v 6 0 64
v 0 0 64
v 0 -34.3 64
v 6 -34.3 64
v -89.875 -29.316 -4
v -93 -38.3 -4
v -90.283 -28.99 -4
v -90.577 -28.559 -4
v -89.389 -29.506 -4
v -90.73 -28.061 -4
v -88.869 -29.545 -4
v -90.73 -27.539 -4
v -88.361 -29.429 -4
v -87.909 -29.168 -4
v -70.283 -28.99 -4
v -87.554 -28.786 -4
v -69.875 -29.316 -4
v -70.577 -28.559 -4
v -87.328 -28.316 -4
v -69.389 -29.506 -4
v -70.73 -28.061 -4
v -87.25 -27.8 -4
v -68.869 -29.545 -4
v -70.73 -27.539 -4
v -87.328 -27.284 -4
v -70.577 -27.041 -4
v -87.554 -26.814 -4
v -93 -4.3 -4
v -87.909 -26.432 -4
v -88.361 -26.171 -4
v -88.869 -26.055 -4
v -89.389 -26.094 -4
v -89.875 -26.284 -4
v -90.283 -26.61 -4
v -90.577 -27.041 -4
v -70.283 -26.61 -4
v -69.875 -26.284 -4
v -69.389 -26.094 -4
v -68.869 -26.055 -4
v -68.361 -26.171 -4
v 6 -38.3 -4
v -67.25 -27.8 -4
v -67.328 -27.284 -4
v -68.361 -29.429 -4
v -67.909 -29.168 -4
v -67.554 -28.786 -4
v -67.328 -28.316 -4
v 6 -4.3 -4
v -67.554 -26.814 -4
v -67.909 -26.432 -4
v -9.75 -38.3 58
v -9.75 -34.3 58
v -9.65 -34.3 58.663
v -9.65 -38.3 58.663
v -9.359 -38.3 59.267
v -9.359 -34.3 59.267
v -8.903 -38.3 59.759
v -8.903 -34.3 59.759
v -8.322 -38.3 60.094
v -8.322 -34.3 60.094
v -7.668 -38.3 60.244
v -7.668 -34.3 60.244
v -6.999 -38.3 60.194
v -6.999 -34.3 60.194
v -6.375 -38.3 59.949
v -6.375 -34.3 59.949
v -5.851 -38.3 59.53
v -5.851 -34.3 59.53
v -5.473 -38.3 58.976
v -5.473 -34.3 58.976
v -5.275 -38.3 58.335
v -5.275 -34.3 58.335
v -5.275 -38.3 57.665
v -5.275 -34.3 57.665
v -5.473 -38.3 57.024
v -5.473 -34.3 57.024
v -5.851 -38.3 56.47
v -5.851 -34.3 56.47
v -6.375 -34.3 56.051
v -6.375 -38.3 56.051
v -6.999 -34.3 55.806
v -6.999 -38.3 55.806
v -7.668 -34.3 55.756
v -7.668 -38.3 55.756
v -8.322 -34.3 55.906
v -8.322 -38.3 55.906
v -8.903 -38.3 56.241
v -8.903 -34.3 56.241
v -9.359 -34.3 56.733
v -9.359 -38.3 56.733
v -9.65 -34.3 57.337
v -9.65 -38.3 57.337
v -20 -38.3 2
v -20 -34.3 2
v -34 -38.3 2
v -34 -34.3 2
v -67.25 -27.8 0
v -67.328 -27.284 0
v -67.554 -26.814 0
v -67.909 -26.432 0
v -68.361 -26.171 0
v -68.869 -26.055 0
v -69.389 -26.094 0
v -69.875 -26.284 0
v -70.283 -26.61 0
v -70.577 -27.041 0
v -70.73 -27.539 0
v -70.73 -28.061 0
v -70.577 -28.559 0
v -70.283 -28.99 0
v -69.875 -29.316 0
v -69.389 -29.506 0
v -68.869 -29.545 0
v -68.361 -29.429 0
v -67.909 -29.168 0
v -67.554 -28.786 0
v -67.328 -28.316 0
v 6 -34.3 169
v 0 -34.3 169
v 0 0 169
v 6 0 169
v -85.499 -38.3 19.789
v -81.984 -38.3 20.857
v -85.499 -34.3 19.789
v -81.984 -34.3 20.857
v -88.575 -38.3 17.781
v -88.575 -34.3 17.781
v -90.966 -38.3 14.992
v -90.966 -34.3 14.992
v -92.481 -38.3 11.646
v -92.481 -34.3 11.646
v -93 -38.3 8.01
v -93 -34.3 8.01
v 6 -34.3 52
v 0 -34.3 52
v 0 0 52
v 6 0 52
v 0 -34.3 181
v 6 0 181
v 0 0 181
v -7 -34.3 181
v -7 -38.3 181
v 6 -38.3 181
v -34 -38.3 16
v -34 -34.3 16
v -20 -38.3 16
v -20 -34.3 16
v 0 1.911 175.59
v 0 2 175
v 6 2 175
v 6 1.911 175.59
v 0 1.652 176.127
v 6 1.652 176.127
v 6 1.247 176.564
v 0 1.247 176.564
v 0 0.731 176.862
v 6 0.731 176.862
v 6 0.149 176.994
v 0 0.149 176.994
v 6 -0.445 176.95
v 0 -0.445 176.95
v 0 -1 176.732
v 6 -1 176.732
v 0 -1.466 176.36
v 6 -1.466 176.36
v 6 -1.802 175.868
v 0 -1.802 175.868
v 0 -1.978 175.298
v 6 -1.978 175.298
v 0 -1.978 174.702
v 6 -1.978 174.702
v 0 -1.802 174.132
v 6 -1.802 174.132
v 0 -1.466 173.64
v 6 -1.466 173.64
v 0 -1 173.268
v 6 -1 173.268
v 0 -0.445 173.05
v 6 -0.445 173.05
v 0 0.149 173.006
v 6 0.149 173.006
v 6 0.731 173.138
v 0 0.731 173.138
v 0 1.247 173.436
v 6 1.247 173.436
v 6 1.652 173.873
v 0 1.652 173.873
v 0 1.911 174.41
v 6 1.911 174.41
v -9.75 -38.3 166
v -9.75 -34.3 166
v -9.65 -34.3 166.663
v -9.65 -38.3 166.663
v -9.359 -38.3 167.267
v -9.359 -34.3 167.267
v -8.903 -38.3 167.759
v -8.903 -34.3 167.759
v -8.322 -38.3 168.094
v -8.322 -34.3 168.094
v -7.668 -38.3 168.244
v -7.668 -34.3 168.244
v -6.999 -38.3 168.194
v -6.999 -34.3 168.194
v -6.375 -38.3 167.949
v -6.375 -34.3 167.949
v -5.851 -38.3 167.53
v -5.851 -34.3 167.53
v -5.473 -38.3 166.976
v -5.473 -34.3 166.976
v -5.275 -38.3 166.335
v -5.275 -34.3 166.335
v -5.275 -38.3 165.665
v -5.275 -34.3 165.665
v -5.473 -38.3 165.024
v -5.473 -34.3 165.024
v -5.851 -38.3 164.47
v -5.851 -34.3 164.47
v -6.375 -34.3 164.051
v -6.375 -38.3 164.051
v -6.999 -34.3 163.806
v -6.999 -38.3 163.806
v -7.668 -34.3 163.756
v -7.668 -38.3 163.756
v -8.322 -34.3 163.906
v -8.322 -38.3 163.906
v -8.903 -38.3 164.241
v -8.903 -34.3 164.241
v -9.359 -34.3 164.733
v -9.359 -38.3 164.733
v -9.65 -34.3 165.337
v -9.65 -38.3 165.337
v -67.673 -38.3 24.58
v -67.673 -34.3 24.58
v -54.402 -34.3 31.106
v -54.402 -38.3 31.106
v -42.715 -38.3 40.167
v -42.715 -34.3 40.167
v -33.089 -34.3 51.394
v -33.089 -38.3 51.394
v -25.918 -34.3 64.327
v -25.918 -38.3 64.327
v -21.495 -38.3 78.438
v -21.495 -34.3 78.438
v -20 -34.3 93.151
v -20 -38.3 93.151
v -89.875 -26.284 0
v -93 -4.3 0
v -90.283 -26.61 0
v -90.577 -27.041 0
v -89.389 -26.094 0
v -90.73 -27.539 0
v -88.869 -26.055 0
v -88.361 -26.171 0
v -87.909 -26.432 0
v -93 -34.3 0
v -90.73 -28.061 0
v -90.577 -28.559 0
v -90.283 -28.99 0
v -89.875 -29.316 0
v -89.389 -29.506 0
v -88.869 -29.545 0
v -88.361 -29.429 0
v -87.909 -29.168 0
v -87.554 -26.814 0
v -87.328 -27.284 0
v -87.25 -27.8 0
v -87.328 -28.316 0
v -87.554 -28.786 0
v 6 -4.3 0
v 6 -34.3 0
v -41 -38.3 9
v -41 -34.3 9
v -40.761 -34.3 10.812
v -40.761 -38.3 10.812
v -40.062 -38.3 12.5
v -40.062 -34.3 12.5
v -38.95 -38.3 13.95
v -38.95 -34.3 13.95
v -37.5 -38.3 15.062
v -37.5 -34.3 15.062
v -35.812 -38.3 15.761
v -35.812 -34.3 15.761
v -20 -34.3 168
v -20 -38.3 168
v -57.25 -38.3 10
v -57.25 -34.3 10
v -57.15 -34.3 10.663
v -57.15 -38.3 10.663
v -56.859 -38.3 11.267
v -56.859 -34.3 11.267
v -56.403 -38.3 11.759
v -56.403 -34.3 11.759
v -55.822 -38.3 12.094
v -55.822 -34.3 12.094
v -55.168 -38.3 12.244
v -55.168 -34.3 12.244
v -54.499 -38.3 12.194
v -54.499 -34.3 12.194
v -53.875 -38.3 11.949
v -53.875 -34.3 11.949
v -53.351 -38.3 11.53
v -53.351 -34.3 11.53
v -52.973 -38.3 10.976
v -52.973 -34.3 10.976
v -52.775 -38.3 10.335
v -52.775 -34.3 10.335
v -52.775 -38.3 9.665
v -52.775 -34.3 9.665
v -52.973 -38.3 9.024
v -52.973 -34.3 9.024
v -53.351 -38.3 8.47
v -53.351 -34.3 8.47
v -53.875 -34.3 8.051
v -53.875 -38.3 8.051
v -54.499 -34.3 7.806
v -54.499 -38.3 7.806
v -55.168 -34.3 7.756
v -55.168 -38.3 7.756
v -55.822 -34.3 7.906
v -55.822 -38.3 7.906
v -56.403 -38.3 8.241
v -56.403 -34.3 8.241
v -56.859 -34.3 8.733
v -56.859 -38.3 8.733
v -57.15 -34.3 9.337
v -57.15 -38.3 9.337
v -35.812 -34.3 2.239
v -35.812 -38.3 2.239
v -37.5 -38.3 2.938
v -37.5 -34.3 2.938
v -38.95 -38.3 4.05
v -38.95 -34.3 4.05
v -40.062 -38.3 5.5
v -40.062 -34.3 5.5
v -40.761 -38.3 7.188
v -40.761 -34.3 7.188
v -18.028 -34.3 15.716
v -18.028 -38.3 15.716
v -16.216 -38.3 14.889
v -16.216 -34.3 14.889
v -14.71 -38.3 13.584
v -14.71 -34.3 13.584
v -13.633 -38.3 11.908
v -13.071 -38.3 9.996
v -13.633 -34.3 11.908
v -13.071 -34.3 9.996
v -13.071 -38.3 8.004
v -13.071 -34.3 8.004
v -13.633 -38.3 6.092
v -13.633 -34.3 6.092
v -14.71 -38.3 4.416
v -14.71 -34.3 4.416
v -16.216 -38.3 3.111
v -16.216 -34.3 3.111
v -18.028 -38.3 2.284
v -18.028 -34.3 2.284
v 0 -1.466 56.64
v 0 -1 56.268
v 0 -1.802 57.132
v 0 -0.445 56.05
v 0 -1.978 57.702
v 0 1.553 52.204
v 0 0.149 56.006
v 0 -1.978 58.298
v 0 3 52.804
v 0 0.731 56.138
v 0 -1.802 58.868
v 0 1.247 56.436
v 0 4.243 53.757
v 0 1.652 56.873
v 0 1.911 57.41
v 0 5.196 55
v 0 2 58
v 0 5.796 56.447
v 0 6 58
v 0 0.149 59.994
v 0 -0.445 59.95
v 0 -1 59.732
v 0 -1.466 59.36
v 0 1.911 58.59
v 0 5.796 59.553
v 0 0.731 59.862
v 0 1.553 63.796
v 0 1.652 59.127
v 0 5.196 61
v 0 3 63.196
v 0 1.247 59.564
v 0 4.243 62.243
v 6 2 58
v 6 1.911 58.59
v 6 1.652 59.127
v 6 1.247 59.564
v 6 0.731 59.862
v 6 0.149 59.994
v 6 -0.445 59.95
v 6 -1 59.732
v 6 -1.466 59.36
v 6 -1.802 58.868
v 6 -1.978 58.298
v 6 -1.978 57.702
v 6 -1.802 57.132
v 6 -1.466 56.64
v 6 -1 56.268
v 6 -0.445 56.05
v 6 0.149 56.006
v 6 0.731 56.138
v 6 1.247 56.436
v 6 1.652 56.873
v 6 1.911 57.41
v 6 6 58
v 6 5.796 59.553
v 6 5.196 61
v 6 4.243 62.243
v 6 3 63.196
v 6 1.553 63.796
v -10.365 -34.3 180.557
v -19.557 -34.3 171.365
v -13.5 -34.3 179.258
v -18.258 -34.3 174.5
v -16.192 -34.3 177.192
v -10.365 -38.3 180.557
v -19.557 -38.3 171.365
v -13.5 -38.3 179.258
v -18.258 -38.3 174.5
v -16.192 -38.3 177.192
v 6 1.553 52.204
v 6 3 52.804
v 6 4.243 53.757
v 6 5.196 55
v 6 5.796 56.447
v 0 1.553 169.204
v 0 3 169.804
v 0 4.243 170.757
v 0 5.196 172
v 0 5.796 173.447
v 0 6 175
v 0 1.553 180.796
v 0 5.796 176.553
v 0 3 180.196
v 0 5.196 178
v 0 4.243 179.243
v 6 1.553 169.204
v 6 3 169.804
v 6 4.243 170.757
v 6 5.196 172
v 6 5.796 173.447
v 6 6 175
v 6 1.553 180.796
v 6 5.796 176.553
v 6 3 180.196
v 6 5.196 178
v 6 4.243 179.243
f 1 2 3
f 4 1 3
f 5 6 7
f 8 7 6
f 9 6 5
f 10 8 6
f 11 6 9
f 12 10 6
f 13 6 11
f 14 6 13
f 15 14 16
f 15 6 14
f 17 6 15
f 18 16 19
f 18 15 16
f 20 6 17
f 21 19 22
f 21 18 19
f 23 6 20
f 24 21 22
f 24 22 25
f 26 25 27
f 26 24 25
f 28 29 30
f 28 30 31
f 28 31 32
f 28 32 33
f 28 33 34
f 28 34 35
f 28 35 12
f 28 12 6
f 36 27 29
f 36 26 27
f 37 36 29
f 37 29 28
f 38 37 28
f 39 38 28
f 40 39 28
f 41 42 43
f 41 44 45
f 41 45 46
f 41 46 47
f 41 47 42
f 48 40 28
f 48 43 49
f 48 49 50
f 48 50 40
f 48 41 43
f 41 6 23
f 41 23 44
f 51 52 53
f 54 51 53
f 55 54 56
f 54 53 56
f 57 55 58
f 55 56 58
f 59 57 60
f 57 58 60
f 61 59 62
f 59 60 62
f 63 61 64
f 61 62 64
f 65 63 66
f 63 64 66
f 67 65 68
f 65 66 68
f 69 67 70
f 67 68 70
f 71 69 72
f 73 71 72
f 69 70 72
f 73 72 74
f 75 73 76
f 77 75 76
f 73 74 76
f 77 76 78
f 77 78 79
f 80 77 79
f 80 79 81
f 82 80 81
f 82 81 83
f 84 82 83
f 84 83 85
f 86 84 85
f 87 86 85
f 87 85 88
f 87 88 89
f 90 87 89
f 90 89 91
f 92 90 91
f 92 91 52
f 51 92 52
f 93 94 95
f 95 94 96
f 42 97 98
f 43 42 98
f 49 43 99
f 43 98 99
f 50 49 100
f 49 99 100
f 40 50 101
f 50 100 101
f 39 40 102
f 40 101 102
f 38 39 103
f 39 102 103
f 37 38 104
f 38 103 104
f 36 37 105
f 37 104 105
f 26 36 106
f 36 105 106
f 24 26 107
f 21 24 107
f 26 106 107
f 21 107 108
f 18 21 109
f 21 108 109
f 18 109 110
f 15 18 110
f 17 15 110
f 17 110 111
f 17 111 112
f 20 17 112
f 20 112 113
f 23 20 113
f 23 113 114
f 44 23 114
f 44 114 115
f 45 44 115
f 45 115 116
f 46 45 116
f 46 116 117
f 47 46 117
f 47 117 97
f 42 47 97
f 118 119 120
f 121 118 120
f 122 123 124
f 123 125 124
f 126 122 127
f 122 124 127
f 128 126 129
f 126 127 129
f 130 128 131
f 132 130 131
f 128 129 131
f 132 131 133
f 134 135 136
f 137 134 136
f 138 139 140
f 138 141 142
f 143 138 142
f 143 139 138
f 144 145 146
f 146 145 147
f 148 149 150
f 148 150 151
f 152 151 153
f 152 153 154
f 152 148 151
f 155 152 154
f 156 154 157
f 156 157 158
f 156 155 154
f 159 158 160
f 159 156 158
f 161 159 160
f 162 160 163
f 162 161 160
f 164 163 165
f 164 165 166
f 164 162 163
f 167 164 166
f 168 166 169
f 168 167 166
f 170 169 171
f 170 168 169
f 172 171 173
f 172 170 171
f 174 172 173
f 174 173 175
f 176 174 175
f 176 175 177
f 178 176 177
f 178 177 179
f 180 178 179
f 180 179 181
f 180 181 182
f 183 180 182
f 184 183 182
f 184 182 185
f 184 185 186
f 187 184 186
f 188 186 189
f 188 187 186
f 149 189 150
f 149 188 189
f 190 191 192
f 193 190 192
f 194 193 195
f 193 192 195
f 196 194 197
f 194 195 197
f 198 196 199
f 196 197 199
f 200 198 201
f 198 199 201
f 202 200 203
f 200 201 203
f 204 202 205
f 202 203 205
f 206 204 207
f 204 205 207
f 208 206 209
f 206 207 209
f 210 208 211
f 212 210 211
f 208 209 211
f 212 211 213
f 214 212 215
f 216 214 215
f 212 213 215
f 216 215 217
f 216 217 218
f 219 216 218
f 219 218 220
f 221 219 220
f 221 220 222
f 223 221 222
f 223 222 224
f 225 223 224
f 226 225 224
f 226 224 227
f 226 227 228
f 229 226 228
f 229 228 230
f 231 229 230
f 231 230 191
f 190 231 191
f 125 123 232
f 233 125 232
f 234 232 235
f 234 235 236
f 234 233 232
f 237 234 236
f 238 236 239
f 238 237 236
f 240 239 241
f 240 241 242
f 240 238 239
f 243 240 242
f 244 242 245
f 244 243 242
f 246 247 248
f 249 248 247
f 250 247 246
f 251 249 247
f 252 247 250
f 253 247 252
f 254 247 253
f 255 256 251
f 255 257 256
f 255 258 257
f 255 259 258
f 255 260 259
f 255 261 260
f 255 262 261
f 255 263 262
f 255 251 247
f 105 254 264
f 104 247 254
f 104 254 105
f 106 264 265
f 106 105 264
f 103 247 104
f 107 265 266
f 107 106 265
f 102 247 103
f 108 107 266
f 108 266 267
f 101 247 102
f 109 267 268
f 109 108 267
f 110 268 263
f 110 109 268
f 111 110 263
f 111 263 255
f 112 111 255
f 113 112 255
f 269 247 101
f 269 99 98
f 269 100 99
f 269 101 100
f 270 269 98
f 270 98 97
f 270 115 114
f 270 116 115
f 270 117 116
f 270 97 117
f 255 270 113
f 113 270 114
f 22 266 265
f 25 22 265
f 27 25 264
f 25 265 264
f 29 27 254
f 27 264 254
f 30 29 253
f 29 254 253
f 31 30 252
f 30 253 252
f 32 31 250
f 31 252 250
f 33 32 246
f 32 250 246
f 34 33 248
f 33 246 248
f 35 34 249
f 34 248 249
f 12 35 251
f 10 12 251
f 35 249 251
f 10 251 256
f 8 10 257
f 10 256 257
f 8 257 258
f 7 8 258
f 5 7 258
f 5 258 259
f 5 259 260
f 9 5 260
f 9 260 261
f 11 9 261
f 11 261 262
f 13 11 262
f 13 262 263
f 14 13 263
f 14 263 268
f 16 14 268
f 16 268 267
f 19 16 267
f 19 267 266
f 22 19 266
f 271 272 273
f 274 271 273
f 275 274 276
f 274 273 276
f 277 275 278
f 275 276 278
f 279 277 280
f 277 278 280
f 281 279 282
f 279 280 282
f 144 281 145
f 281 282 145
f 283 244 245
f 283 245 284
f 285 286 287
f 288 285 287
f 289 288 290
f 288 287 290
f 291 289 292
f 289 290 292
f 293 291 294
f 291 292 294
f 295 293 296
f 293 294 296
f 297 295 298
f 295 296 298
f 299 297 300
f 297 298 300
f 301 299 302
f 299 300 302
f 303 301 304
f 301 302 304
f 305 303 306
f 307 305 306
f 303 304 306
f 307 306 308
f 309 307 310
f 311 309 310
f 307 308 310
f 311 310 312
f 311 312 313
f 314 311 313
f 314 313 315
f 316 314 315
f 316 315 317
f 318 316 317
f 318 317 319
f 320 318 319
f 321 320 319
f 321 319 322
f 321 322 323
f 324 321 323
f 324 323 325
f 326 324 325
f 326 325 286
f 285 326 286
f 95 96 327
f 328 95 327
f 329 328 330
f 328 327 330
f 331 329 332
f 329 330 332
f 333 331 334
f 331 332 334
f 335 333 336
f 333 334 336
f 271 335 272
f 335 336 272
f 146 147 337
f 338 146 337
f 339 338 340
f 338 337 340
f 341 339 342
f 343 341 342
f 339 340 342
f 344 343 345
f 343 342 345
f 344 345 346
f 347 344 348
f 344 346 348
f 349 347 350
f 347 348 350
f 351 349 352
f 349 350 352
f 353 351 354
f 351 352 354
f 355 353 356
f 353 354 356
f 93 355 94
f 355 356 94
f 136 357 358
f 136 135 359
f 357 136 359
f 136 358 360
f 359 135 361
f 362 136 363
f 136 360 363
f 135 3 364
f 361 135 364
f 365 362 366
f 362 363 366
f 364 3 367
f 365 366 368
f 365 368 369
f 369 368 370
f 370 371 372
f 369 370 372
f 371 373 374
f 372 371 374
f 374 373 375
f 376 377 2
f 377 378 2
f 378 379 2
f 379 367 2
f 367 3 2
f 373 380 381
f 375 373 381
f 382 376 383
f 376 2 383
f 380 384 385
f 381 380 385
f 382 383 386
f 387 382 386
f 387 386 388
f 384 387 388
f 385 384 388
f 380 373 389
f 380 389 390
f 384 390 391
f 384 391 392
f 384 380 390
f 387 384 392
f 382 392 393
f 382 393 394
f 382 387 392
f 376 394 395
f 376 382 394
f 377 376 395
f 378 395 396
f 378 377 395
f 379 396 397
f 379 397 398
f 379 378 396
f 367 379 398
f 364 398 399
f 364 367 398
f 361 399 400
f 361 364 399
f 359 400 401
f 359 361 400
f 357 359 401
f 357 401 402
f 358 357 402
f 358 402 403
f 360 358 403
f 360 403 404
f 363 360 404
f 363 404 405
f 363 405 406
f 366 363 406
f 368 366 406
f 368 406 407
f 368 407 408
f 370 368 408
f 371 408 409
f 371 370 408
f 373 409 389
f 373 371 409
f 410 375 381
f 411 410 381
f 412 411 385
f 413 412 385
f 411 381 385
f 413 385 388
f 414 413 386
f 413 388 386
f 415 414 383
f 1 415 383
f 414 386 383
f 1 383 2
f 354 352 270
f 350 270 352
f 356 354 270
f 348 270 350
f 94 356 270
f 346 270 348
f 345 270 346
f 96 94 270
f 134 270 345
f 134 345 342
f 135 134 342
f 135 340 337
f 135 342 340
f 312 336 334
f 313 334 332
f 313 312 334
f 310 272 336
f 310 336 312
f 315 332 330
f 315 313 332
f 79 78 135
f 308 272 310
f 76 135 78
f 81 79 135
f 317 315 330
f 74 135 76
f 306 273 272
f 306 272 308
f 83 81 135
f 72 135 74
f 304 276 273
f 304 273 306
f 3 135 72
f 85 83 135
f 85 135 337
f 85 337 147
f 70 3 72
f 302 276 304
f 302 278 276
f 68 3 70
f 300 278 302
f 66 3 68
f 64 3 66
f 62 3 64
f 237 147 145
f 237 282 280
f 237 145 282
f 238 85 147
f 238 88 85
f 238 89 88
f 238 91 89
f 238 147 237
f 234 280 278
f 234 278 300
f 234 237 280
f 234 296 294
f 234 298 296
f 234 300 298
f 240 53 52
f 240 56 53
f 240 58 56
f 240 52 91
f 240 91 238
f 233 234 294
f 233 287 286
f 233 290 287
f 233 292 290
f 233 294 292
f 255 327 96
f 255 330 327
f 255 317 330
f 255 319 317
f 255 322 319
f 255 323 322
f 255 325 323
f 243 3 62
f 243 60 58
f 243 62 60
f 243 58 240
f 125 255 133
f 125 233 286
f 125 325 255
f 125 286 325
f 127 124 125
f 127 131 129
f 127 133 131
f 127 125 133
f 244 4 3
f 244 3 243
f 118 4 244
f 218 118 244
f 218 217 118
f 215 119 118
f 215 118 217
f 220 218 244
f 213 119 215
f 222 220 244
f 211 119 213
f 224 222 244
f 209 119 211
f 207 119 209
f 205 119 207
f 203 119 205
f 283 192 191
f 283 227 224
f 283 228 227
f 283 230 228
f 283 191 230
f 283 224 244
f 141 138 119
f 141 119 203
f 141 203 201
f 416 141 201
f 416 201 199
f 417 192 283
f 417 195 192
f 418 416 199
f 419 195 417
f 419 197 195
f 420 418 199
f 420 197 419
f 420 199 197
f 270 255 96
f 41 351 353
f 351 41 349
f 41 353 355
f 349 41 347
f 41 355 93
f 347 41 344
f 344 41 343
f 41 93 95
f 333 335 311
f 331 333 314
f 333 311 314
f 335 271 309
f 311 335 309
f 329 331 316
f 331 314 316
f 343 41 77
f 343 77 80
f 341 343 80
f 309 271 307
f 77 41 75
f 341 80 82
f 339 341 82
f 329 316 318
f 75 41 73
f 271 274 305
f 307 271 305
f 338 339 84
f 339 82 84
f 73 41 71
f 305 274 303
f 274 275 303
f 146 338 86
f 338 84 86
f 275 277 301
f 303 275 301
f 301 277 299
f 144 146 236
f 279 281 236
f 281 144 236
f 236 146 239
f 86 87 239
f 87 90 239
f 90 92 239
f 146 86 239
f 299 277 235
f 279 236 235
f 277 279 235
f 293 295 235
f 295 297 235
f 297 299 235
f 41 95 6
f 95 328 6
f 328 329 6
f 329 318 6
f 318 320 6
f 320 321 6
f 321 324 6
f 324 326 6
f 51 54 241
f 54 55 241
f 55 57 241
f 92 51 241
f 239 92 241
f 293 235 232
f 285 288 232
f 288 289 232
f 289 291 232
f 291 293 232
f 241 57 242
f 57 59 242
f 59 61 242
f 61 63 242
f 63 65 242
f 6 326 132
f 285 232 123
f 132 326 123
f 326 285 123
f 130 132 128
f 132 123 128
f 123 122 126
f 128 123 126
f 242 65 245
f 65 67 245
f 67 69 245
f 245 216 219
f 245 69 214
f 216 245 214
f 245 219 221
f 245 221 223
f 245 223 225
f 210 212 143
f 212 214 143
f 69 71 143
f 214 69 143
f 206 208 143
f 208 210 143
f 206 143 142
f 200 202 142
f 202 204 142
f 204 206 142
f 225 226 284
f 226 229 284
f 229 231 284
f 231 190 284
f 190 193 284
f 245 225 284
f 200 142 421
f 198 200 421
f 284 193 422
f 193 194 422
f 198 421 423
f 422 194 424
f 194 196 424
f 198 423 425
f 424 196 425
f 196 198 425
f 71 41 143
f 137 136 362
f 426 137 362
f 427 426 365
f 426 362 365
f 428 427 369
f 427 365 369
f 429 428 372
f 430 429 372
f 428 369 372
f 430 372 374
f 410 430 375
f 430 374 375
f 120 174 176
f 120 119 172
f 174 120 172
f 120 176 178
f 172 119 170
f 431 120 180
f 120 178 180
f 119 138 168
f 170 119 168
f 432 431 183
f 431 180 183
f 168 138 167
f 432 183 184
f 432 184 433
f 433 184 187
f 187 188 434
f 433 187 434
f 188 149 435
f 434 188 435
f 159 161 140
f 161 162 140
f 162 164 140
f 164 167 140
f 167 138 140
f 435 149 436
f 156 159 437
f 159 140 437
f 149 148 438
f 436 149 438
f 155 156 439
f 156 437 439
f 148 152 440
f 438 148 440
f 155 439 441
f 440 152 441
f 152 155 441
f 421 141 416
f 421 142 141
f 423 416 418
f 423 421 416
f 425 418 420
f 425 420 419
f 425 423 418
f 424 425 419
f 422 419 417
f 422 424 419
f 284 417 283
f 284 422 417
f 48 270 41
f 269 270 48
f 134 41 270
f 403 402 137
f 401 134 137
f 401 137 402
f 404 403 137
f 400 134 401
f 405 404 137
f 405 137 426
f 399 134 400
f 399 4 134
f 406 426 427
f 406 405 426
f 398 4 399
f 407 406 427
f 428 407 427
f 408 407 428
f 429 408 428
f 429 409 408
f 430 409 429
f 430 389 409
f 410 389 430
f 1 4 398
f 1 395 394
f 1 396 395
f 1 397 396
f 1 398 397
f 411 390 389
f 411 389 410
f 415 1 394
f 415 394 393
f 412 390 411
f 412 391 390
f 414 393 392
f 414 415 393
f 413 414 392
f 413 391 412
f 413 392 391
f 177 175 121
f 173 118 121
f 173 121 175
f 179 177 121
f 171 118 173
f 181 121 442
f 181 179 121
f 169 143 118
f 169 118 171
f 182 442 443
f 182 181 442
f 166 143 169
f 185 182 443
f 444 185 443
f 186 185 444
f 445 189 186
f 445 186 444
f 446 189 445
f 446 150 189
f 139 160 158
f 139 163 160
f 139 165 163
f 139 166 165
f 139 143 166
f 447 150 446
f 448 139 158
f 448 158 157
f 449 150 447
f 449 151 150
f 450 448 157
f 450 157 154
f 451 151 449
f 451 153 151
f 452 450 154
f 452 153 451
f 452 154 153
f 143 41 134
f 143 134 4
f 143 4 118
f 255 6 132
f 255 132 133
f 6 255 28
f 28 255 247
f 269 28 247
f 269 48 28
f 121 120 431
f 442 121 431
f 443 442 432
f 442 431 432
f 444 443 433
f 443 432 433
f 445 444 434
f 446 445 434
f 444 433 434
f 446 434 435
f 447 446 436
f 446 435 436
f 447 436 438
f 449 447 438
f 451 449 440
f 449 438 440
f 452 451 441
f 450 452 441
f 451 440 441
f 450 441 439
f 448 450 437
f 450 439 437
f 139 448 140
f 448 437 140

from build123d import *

# Parameters (mm, degrees)
F0_R        = 2
F1_DEPTH    = 6
F2_DEPTH    = 93
F4_DEPTH    = 25
F3_R        = 1.75
F5_DEPTH    = 4.001
F6_W        = 73
F6_H        = 161
F6_R        = 2.25
F7_DEPTH    = 4.001
F8_T4_DEPTH = 4
F9_R        = 13


# Not quite as in the source:
# - a fillet or chamfer that OpenCascade refuses, or shapes differently, is made with other operations: its cross-section is extruded or revolved along the edge and cut away or added


with BuildPart() as f1:
    # F0 (on Right) → F1 (new body)
    with BuildSketch(Plane.YZ):
        Polygon((-4.3, 0), (-34.3, 0), (-34.3, 52), (-34.3, 64), (-34.3, 169), (-34.3, 181), (-38.3, 181), (-38.3, -4), (-4.3, -4), align=None)
        with BuildLine():
            Line((-34.3, 181), (-34.3, 169))
            Line((-34.3, 169), (0, 169))
            ThreePointArc((0, 169), (-6, 174.9999999833), (-3.34e-08, 181))
            Line((-3.34e-08, 181), (-34.3, 181))
        make_face()
        with BuildLine():
            Line((-34.3, 64), (-34.3, 52))
            Line((-34.3, 52), (-5.41e-08, 52))
            ThreePointArc((-5.41e-08, 52), (-6, 58.0000000477), (4.13e-08, 64))
            Line((4.13e-08, 64), (-34.3, 64))
        make_face()
        with BuildLine():
            ThreePointArc((-3.34e-08, 181), (-6, 174.9999999833), (0, 169))
            ThreePointArc((0, 169), (4.2426406871, 170.7573593129), (6, 175))
            ThreePointArc((6, 175), (4.2426406753, 179.2426406989), (-3.34e-08, 181))
        make_face()
        with Locations((0, 175)):
            Circle(F0_R, mode=Mode.SUBTRACT)
        with BuildLine():
            ThreePointArc((4.13e-08, 64), (-6, 58.0000000477), (-5.41e-08, 52))
            ThreePointArc((-5.41e-08, 52), (4.242640668, 53.7573592937), (6, 58))
            ThreePointArc((6, 58), (4.2426407017, 62.2426406725), (4.13e-08, 64))
        make_face()
        with Locations((0, 58)):
            Circle(F0_R, mode=Mode.SUBTRACT)
    extrude(amount=F1_DEPTH)

    # F0 (on Right) → F2 (join)
    with BuildSketch(Plane.YZ):
        Polygon((-4.3, 0), (-34.3, 0), (-34.3, 52), (-34.3, 64), (-34.3, 169), (-34.3, 181), (-38.3, 181), (-38.3, -4), (-4.3, -4), align=None)
    extrude(amount=-F2_DEPTH)

    # F0 (on Right) → F4 (join)
    with BuildSketch(Plane.YZ):
        Polygon((-4.3, 0), (-34.3, 0), (-34.3, 52), (-34.3, 64), (-34.3, 169), (-34.3, 181), (-38.3, 181), (-38.3, -4), (-4.3, -4), align=None)
    extrude(amount=-F4_DEPTH)

    # F3 (on face) → F5 (cut, through all)
    with BuildSketch(Plane.XY):
        with Locations((-89, -27.8)):
            Circle(F3_R)
        with Locations((-69, -27.8)):
            Circle(F3_R)
    extrude(amount=-F5_DEPTH, mode=Mode.SUBTRACT)

    # F6 (on face) → F7 (cut, through all)
    with BuildSketch(Plane(origin=(0, -34.3, 0), x_dir=(-1, 0, 0), z_dir=(0, 1, 0))):
        with Locations((56.5, 100.5)):
            Rectangle(F6_W, F6_H)
        with BuildLine():
            ThreePointArc((20, 2), (24.9497474683, 4.0502525317), (27, 9))
            ThreePointArc((27, 9), (24.9497474683, 13.9497474683), (20, 16))
            ThreePointArc((20, 16), (13, 9), (20, 2))
        make_face()
        with BuildLine():
            ThreePointArc((34, 2), (29.0502525317, 4.0502525317), (27, 9))
            ThreePointArc((27, 9), (24.9497474683, 4.0502525317), (20, 2))
            Line((20, 2), (34, 2))
        make_face()
        with BuildLine():
            ThreePointArc((20, 16), (24.9497474683, 13.9497474683), (27, 9))
            ThreePointArc((27, 9), (29.0502525317, 13.9497474683), (34, 16))
            Line((34, 16), (20, 16))
        make_face()
        with BuildLine():
            ThreePointArc((34, 16), (29.0502525317, 13.9497474683), (27, 9))
            ThreePointArc((27, 9), (29.0502525317, 4.0502525317), (34, 2))
            ThreePointArc((34, 2), (38.9497474683, 4.0502525317), (41, 9))
            ThreePointArc((41, 9), (38.9497474683, 13.9497474683), (34, 16))
        make_face()
        with Locations((7.5, 166)):
            Circle(F6_R)
        with Locations((7.5, 58)):
            Circle(F6_R)
        with Locations((55, 10)):
            Circle(F6_R)
    extrude(amount=-F7_DEPTH, mode=Mode.SUBTRACT)

    # F8: fillet of radius 73.1506709399 on 1 edges, made by hand


with BuildPart() as f8_tool2:
    # F8_s3 → F8_t4 (new body)
    with BuildSketch(Plane.XZ.offset(34.3)):
        with BuildLine():
            ThreePointArc((-93.1506709399, 20), (-41.42533547, 41.42533547), (-20, 93.1506709399))
            Line((-20, 93.1506709399), (-20, 20))
            Line((-20, 20), (-93.1506709399, 20))
        make_face()
    extrude(amount=F8_T4_DEPTH)

    split(bisect_by=Plane.YZ.offset(-93), keep=Keep.TOP)


with BuildPart() as f1_1:
    add(f1.part)

    # F8_t1: union F8_tool2
    add(f8_tool2.part)

    # F9
    f9_edges = [f1_1.edges().sort_by_distance(p)[0] for p in [
        (-20, -36.3, 181),
        (-93, -36.3, 20.000155),
    ]]
    fillet(f9_edges, radius=F9_R)


solid = f1_1.part
